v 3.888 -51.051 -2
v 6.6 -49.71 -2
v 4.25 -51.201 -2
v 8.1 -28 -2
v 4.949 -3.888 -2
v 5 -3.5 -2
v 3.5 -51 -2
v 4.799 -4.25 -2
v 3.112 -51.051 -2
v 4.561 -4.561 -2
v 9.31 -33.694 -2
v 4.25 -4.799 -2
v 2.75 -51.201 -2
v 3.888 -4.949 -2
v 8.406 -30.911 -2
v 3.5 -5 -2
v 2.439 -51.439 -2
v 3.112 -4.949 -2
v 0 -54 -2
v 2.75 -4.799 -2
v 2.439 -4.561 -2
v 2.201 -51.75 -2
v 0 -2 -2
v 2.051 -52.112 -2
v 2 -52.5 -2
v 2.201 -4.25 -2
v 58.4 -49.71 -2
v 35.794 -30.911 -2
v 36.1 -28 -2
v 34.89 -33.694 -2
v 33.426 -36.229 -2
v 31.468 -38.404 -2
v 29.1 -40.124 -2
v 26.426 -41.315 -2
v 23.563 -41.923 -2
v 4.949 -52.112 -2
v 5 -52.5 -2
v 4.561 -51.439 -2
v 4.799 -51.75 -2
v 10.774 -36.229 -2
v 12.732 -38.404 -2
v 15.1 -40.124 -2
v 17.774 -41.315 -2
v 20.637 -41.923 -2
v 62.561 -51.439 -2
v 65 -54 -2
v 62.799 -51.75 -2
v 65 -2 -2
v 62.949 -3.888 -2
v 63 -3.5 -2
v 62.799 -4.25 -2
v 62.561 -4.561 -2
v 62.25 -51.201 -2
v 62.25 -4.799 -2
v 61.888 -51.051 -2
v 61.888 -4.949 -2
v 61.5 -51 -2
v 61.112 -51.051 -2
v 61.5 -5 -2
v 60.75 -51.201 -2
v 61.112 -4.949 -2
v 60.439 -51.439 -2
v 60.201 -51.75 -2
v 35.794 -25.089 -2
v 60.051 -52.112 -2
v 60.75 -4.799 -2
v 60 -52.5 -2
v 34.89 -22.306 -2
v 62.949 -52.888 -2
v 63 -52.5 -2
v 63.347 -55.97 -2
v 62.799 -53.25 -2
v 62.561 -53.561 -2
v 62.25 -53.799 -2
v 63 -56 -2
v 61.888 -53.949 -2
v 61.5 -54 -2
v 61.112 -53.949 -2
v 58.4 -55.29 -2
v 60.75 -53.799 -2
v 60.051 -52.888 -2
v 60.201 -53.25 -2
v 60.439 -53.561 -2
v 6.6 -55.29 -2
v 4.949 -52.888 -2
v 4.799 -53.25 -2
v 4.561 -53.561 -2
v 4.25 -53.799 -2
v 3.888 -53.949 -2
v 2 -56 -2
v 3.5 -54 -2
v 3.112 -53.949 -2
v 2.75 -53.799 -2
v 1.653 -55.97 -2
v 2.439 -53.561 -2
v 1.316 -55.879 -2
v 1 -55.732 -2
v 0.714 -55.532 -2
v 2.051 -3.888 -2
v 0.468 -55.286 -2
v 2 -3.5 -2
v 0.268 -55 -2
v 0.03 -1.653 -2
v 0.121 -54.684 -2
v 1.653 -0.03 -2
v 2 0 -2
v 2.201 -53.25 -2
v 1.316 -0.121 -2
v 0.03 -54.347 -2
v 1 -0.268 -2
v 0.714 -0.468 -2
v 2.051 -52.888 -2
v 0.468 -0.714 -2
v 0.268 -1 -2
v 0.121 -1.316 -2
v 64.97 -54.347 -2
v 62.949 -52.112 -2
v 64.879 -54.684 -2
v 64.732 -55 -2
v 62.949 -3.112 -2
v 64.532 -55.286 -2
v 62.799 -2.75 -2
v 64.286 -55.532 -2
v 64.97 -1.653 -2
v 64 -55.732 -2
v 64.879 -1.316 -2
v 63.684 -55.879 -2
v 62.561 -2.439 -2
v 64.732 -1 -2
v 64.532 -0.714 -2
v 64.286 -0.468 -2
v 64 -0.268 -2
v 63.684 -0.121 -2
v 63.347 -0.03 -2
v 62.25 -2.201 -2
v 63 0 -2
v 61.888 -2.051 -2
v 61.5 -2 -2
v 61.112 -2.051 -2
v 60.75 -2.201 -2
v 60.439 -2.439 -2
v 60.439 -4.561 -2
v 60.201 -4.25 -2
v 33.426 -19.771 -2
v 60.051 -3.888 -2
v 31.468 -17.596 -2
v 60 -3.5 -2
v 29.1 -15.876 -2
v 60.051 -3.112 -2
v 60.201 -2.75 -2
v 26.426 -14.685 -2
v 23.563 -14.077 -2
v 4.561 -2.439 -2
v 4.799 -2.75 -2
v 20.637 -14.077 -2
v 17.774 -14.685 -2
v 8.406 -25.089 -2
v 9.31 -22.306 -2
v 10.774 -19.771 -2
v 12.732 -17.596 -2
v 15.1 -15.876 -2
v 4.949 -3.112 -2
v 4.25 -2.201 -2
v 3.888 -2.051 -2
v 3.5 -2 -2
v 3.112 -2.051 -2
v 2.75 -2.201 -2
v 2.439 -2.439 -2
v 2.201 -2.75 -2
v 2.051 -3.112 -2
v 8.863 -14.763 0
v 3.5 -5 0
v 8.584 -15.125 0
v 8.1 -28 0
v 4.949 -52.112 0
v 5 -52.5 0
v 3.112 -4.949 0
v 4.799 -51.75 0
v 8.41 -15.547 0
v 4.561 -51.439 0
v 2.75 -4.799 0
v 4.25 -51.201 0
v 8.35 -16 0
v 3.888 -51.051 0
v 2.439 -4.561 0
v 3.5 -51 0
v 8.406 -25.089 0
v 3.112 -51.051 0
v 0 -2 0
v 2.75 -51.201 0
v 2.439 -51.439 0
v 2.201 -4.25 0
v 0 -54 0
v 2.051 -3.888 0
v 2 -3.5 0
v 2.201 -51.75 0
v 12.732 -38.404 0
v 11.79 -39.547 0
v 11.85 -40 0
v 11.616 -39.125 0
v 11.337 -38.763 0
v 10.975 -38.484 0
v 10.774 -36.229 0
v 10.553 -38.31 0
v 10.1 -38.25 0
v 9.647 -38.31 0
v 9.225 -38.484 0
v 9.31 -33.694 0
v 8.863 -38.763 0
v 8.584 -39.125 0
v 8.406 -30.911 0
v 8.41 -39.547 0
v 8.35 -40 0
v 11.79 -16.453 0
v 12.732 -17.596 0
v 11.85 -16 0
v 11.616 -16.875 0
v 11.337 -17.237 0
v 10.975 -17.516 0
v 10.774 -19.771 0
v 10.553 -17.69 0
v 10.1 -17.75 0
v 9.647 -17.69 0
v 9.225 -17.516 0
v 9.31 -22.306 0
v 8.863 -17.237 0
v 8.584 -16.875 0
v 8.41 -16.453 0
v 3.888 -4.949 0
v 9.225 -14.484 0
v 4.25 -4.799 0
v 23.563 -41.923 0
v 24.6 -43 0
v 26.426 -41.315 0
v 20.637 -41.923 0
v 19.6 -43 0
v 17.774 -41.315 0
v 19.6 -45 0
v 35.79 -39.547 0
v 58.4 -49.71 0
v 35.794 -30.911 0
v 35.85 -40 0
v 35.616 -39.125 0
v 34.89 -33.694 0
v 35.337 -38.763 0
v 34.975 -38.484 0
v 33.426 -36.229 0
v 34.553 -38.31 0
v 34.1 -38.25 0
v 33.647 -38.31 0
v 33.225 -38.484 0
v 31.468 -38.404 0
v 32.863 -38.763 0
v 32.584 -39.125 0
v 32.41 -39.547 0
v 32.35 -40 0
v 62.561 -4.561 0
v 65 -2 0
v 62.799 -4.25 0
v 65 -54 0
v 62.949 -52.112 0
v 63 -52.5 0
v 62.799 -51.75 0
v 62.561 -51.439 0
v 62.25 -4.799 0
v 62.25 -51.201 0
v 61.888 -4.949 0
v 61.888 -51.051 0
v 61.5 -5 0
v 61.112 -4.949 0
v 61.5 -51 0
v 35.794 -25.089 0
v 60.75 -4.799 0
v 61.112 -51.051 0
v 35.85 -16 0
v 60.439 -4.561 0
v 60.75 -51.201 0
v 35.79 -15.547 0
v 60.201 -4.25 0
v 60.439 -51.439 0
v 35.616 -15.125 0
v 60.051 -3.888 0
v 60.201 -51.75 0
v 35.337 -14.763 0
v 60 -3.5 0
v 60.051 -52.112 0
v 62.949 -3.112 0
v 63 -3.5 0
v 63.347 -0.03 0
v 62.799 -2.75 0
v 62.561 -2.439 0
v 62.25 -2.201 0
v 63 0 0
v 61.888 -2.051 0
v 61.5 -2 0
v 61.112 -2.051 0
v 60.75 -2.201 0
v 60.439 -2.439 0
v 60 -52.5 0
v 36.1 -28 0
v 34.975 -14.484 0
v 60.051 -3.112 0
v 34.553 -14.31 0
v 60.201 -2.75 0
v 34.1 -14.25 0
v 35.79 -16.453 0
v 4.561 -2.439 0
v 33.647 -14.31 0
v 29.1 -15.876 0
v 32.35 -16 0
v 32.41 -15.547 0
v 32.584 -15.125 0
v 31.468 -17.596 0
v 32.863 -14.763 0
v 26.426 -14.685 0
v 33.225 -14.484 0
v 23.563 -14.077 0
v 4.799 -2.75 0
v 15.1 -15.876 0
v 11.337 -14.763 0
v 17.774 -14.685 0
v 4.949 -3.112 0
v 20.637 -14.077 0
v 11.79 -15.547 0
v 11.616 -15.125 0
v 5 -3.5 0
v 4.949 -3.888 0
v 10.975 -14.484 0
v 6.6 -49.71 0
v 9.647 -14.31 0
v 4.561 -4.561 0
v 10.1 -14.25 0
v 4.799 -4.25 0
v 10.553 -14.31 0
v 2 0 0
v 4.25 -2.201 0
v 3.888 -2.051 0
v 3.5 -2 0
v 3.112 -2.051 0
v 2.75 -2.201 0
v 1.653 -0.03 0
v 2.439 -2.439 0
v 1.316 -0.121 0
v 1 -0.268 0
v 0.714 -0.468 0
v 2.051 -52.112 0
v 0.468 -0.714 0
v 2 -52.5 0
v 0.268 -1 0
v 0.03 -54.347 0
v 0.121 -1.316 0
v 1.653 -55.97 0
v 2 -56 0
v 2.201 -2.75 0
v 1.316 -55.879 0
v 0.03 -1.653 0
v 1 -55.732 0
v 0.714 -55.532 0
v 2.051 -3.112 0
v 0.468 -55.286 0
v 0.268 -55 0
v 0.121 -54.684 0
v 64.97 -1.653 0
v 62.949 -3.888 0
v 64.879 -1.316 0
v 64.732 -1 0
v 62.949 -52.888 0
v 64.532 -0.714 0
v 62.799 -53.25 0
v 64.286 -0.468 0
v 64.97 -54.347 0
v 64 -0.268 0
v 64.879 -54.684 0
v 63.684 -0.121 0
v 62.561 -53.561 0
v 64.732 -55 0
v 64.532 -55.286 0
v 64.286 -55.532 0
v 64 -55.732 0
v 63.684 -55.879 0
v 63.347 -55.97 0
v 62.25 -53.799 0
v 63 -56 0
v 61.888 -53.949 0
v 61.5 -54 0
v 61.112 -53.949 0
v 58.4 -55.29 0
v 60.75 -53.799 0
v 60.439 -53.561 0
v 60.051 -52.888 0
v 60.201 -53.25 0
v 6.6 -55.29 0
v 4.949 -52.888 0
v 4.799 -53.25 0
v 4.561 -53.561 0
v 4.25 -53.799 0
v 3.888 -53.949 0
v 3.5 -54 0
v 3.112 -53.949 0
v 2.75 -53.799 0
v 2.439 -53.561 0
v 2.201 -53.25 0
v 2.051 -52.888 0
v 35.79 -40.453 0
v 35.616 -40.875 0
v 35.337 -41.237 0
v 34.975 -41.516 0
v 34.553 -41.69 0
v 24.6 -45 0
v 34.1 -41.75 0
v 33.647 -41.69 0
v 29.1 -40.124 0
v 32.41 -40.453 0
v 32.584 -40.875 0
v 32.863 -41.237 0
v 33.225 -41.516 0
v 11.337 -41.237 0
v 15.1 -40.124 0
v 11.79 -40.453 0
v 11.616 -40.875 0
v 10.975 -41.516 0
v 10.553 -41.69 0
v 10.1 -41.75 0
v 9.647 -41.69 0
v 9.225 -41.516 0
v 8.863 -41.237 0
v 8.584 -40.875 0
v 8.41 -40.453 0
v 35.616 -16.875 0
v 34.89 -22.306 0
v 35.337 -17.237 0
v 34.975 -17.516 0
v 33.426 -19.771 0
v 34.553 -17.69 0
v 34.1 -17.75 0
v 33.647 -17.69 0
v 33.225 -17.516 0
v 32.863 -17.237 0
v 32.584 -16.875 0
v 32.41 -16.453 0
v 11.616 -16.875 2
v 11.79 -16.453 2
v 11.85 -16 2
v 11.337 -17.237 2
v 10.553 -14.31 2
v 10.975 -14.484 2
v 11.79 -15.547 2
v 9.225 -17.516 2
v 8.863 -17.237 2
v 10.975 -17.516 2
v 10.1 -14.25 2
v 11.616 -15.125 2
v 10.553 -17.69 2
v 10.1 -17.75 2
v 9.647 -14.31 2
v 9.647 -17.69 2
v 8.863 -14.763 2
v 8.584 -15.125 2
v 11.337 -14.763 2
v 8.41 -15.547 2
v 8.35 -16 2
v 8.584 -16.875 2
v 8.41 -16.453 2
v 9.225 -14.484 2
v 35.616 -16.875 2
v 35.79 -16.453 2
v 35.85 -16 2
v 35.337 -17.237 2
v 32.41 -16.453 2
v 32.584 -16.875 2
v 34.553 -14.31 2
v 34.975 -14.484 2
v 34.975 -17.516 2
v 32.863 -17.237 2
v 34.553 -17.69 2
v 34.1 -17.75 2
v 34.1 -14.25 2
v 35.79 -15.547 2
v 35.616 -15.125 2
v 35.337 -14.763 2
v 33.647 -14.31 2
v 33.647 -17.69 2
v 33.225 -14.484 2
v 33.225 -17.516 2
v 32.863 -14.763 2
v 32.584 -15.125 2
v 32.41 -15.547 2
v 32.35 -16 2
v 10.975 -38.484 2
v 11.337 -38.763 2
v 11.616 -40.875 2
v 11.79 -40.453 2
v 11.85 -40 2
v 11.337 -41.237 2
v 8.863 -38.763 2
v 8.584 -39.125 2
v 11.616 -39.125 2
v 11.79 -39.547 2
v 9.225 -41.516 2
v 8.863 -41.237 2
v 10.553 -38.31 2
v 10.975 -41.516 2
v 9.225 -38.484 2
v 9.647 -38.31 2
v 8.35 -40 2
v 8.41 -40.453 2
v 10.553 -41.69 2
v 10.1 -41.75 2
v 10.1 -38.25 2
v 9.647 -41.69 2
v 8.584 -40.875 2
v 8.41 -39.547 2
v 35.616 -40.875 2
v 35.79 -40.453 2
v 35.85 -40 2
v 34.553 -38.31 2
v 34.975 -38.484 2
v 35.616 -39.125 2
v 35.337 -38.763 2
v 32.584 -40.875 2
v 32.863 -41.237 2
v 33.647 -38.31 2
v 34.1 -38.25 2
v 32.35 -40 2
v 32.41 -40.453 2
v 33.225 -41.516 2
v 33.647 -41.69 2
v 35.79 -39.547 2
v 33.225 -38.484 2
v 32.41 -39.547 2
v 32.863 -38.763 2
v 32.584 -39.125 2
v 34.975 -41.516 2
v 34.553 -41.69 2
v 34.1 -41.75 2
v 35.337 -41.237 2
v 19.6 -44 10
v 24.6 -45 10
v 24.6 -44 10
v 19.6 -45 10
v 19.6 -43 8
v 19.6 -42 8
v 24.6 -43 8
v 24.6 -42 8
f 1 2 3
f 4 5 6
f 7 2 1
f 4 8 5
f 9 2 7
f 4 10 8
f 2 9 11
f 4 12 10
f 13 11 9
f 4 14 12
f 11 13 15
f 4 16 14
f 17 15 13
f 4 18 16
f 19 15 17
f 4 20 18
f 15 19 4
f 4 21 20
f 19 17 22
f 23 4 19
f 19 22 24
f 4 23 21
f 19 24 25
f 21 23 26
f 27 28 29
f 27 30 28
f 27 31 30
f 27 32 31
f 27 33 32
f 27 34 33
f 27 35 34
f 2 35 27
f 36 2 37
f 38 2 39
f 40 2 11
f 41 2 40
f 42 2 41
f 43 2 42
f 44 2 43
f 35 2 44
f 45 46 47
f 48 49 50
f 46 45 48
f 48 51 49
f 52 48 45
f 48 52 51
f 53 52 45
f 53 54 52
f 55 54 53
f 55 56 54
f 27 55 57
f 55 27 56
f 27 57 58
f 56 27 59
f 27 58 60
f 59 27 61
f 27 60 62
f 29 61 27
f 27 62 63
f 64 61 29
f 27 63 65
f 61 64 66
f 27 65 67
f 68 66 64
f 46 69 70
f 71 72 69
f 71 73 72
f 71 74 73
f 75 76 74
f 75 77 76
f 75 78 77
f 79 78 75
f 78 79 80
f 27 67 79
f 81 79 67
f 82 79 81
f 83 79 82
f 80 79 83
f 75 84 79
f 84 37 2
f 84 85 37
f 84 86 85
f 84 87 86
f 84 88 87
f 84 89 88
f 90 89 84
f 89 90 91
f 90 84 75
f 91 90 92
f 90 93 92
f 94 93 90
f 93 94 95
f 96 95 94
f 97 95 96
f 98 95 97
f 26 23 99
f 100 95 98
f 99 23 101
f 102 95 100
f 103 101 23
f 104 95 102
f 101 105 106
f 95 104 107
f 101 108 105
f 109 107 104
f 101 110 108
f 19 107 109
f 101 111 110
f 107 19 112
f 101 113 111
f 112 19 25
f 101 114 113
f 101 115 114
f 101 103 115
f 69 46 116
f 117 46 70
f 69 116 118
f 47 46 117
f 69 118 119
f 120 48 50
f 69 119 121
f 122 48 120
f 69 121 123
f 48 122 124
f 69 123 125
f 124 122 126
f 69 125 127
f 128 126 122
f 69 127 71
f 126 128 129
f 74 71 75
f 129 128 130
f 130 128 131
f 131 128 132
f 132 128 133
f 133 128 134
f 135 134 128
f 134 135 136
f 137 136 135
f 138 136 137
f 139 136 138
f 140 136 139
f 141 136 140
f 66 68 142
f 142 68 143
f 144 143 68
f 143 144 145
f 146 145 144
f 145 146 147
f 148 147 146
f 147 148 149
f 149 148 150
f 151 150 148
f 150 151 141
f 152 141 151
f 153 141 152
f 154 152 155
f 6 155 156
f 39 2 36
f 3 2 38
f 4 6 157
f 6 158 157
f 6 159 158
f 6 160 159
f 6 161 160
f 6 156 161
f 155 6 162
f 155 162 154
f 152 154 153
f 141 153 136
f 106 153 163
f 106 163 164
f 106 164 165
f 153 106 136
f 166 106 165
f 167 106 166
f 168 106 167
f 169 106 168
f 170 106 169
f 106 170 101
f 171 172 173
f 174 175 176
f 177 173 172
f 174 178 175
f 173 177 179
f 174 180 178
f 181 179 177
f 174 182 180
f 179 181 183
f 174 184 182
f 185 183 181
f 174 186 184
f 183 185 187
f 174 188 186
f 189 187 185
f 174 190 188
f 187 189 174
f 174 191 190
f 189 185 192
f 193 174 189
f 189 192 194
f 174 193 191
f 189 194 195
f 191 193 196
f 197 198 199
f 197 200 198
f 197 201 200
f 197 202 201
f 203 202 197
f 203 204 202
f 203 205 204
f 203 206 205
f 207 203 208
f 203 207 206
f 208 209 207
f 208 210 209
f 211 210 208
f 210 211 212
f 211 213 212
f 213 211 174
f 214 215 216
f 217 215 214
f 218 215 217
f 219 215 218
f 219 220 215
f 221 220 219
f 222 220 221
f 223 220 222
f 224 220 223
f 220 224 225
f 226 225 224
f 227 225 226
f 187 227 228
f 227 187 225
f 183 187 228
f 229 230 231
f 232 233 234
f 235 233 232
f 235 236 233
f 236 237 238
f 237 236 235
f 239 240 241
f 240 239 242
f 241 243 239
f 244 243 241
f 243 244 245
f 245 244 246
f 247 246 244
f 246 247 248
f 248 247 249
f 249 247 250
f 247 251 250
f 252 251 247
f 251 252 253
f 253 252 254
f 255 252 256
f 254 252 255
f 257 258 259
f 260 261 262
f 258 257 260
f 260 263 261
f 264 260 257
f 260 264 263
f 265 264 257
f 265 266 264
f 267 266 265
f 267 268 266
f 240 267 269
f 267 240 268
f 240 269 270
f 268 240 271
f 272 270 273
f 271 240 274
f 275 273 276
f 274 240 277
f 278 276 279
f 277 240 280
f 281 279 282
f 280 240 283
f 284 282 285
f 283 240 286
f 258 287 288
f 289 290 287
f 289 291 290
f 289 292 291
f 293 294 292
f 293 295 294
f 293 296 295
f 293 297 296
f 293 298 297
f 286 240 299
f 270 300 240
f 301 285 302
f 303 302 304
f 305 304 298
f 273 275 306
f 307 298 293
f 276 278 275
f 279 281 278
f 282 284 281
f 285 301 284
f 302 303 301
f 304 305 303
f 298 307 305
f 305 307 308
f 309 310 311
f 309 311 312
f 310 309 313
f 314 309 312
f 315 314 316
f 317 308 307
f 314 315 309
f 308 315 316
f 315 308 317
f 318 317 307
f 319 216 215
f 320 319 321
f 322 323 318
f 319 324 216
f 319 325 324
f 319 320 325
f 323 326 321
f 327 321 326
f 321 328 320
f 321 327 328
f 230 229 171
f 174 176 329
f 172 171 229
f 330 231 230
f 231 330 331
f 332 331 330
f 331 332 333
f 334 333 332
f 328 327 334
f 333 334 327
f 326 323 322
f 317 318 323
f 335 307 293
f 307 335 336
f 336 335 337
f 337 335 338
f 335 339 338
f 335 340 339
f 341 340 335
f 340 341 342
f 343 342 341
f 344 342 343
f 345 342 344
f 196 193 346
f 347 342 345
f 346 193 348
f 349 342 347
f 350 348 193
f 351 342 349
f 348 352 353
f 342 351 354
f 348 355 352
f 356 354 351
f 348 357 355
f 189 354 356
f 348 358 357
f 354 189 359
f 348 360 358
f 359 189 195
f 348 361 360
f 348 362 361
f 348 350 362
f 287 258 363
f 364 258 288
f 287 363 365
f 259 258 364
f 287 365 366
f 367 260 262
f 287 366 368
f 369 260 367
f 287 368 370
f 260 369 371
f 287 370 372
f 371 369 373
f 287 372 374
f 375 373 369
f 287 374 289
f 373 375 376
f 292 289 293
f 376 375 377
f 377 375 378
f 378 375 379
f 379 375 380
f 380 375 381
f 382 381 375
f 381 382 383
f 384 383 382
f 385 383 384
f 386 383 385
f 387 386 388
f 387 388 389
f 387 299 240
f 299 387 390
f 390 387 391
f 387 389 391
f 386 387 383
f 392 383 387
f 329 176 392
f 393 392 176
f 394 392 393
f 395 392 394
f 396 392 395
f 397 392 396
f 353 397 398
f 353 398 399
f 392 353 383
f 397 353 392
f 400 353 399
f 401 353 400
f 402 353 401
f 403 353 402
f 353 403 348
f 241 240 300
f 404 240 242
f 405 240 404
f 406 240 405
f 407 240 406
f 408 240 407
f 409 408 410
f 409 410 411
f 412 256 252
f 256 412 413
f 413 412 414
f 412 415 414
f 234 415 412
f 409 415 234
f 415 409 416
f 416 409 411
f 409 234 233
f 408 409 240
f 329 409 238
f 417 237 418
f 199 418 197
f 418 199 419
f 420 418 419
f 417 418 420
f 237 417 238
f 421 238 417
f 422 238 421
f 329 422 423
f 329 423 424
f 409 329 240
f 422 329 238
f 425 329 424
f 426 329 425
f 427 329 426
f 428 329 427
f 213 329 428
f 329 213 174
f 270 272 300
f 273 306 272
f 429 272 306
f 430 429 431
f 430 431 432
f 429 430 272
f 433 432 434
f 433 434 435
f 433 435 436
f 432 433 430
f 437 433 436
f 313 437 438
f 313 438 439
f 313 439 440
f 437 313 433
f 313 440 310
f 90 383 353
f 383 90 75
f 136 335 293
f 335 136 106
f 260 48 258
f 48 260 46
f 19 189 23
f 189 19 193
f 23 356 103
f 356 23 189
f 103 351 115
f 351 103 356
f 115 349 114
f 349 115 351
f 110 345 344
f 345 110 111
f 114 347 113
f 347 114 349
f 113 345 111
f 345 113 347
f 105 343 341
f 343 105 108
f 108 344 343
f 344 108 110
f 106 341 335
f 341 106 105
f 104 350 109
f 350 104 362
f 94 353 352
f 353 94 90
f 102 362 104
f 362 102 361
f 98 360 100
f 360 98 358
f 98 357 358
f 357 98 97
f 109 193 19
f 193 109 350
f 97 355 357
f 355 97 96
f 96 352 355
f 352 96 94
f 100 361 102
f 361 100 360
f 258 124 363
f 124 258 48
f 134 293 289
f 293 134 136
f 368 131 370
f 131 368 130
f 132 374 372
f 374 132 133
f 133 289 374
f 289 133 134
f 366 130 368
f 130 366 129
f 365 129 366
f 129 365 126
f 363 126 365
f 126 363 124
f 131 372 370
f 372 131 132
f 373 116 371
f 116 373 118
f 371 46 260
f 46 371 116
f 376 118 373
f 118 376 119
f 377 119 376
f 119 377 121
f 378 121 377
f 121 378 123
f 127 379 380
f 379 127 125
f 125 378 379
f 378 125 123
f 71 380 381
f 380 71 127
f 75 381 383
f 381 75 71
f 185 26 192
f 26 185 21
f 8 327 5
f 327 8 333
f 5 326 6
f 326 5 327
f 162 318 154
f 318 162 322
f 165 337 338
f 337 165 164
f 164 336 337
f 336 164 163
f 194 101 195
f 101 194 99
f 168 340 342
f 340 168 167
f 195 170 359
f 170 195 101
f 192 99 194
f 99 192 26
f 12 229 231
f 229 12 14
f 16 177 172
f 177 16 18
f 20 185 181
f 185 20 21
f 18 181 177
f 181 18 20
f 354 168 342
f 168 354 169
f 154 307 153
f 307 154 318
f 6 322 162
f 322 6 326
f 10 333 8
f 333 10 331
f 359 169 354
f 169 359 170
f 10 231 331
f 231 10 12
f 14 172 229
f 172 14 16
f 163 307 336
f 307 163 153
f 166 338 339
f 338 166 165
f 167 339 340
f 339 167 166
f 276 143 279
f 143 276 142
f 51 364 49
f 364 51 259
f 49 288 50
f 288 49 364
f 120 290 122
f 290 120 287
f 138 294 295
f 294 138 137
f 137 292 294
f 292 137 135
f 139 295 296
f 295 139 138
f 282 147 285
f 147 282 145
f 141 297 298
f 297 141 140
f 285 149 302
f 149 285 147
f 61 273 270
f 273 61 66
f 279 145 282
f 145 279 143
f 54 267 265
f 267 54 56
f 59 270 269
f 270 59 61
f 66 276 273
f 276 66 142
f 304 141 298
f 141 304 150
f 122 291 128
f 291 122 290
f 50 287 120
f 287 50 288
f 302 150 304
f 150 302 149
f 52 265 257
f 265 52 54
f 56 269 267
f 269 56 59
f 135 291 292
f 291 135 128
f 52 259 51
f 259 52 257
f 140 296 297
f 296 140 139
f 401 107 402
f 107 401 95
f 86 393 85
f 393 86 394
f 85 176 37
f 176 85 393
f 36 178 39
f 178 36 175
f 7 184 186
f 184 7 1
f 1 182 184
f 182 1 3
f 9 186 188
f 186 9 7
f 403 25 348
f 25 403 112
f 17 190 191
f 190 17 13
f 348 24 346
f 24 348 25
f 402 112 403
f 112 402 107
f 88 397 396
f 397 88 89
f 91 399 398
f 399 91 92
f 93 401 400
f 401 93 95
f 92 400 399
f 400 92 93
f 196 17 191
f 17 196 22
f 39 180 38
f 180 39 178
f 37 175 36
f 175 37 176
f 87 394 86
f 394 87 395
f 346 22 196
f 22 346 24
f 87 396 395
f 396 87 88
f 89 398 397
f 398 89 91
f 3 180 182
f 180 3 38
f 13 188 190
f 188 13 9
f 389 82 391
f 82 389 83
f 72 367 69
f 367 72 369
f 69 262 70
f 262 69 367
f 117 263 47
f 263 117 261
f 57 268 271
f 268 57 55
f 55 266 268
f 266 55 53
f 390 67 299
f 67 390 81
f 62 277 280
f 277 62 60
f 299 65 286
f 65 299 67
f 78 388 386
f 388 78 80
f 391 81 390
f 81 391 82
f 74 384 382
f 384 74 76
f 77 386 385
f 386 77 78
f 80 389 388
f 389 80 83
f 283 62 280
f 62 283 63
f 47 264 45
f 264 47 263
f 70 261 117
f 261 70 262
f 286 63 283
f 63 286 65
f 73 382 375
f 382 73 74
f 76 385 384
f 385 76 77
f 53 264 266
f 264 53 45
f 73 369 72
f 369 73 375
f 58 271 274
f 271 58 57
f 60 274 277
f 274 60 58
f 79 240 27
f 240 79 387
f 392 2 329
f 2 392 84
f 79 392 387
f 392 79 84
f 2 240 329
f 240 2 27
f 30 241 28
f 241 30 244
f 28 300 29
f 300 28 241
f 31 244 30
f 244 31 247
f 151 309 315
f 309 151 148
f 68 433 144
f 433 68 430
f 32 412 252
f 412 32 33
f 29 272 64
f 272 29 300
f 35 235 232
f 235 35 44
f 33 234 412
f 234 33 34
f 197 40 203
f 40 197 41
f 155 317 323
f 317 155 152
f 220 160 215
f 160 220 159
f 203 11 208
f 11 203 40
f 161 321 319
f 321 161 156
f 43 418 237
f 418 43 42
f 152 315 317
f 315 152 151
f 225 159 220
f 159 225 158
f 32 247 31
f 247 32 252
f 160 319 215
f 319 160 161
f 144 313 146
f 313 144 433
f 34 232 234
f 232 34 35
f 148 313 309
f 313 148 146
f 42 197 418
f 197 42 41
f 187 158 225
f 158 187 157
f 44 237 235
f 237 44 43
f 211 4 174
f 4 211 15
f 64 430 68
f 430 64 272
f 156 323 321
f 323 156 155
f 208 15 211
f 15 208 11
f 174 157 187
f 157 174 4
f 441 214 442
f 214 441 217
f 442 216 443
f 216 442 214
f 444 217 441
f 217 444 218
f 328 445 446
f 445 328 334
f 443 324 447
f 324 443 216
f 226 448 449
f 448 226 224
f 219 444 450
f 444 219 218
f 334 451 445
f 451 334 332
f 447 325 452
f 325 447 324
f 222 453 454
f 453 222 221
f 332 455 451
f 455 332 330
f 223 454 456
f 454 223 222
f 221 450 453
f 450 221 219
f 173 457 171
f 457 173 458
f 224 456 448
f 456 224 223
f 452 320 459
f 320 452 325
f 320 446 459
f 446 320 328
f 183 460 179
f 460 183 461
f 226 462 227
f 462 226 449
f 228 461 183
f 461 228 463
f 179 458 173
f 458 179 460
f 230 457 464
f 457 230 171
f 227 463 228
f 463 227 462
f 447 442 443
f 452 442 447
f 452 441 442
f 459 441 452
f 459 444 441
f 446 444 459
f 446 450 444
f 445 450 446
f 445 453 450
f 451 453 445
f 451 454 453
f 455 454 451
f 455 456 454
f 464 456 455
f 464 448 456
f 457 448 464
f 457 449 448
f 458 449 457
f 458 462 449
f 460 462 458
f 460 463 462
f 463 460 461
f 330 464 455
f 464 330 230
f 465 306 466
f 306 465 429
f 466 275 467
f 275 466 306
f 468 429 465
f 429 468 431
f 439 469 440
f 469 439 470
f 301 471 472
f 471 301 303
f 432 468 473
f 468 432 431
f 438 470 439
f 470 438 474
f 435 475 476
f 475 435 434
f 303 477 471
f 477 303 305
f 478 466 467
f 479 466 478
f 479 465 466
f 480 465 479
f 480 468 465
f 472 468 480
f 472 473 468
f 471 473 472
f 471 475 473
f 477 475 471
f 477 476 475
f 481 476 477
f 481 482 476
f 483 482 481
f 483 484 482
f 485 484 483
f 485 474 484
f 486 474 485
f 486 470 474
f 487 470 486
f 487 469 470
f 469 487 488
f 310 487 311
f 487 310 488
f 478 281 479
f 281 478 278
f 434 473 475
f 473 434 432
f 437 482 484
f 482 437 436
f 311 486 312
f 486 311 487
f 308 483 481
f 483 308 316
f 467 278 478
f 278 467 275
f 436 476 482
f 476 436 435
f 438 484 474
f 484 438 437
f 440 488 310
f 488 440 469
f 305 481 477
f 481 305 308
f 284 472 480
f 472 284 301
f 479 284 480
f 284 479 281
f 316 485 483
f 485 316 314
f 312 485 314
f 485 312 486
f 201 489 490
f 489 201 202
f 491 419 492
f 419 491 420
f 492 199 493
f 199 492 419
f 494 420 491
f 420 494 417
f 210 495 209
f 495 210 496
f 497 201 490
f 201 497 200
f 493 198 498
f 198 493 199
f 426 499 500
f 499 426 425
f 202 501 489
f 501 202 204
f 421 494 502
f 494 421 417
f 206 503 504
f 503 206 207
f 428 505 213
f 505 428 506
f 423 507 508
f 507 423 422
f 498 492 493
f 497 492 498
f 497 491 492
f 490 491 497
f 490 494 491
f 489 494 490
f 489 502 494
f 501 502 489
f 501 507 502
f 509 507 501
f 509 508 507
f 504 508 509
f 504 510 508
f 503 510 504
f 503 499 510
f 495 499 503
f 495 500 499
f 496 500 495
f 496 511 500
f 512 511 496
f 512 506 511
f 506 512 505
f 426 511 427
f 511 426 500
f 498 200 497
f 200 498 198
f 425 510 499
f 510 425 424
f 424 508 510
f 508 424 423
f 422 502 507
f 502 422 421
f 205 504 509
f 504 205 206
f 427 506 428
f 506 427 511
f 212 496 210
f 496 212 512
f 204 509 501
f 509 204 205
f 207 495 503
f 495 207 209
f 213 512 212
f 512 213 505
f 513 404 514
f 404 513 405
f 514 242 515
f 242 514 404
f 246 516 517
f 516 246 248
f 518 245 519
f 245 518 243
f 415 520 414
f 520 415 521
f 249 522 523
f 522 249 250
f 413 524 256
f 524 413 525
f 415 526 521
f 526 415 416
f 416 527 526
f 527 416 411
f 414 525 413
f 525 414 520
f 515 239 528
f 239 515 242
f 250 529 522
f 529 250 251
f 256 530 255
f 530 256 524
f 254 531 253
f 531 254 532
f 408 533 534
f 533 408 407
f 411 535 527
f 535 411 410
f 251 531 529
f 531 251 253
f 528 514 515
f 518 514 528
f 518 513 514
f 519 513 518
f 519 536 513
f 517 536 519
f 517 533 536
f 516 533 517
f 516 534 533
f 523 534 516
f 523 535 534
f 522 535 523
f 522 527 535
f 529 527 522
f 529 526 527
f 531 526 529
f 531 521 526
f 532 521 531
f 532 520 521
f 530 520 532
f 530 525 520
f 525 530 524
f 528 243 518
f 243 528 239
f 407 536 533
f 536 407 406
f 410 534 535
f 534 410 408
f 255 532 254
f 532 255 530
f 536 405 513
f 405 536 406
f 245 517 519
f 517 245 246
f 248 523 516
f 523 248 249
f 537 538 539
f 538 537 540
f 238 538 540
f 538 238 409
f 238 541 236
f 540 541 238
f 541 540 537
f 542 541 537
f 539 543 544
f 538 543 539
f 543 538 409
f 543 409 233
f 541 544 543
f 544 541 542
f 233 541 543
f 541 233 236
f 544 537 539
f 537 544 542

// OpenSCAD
MM=1;
INCH=25.4*MM;
EPS=0.5*MM;

M5_hole_MM=3.0;


module rounded_cube(l,w,h,r=2*MM) {
  union() {
    translate([r,0,0])
    cube([l-2*r,w,h]);
    translate([0,r,0])
    cube([l,w-2*r,h]);
    translate([r,r,0])
    cylinder(h=h,r1=r,r2=r,$fn=36);
    translate([r,w-r,0])
    cylinder(h=h,r1=r,r2=r,$fn=36);
    translate([l-r,r,0])
    cylinder(h=h,r1=r,r2=r,$fn=36);
    translate([l-r,w-r,0])
    cylinder(h=h,r1=r,r2=r,$fn=36);
  }
}


module bottom_plate() {
difference() {
//main body
translate([0,0,0])
rounded_cube((58+7)*MM,56*MM,2*MM);

//corner holes
translate([3.5*MM,3.5*MM,-1*MM])
cylinder(5,M5_hole_MM/2,M5_hole_MM/2,$fn=24);
translate([(3.5+58)*MM,3.5*MM,-1])
cylinder(5,M5_hole_MM/2,M5_hole_MM/2,$fn=24);
translate([3.5,(3.5+49)*MM,-1])
cylinder(5,M5_hole_MM/2,M5_hole_MM/2,$fn=24);
translate([(3.5+58)*MM,(3.5+49)*MM,-1*MM])
cylinder(5,M5_hole_MM/2,M5_hole_MM/2,$fn=24);

//GPIO hole
translate([(3.5+29)*MM,(3.5+49)*MM,1*MM])
cube([2*INCH+EPS*2,0.2*INCH+EPS,4*MM],center=true);
translate([(3.5+29)*MM-1*INCH+15*MM,(56/2)*MM,-1])
cylinder(h=4*MM,r1=28/2*MM,r2=28/2*MM);
}
}

module fan_hook() {
  translate([-2*MM,-2.5*MM,-1*MM])
  difference(){
  cube([3*MM,5*MM,10*MM+EPS*2]);
  translate([2*MM,-1*MM,-1*MM])
  cube([5*MM,7*MM,9*MM+EPS*2]);
  color("blue")
  translate([0*MM,-1*MM,12*MM])
  rotate([0,45,0])
  cube([5*MM,7*MM,5*MM]);
  }
}

module fan_hole() {
translate([0,0,(7.7/2+1)*MM])
rotate([180,0,0])
union(){
cylinder(h=(7.7/2+1)*MM,r1=4.5*MM/2,r2=4.5*MM/2,$fn=24);
cylinder(h=(7.7+2)*MM,r1=3.2*MM/2,r2=3.2*MM/2,$fn=24);
}
}

module fan() {
  difference() {
    translate([-30.4/2*MM,-30.4/2*MM,-7.7/2*MM])
    rounded_cube(30.4*MM,30.4*MM,7.7*MM,r=3.2*MM);
    
    translate([0,0,-(7.7+1)/2*MM])
    cylinder(h=9.7*MM,r1=27/2*MM,r2=27/2*MM);

    translate([-12*MM,-12*MM,0])
    fan_hole();
    translate([12*MM,-12*MM,0])
    fan_hole();
    translate([-12*MM,12*MM,0])
    fan_hole();
    translate([12*MM,12*MM,0])
    fan_hole();
  }
}

module fan_pegs() {
    translate([-12*MM,-12*MM,-2*MM])
    cylinder(h=3*MM,r=(4*MM-EPS)/2,$fn=24);
    translate([12*MM,-12*MM,-2*MM])
    cylinder(h=3*MM,r=(4*MM-EPS)/2,$fn=24);
    translate([-12*MM,12*MM,-2*MM])
    cylinder(h=3*MM,r=(4*MM-EPS)/2,$fn=24);
    translate([12*MM,12*MM,-2*MM])
    cylinder(h=3*MM,r=(4*MM-EPS)/2,$fn=24);
}

rotate([180,0,0])
union() {
bottom_plate();
//translate([(3.5+29)*MM-1*INCH+15*MM,(56/2)*MM,-7.7/2*MM])color("black")fan();
translate([(3.5+29)*MM-1*INCH+15*MM,(56/2)*MM,0])color("orange")fan_pegs();
translate([(3.5+29)*MM-1*INCH+15*MM,(56/2)*MM+15*MM,0])
rotate([0,0,-90])
rotate([180,0,0])
fan_hook();
}
